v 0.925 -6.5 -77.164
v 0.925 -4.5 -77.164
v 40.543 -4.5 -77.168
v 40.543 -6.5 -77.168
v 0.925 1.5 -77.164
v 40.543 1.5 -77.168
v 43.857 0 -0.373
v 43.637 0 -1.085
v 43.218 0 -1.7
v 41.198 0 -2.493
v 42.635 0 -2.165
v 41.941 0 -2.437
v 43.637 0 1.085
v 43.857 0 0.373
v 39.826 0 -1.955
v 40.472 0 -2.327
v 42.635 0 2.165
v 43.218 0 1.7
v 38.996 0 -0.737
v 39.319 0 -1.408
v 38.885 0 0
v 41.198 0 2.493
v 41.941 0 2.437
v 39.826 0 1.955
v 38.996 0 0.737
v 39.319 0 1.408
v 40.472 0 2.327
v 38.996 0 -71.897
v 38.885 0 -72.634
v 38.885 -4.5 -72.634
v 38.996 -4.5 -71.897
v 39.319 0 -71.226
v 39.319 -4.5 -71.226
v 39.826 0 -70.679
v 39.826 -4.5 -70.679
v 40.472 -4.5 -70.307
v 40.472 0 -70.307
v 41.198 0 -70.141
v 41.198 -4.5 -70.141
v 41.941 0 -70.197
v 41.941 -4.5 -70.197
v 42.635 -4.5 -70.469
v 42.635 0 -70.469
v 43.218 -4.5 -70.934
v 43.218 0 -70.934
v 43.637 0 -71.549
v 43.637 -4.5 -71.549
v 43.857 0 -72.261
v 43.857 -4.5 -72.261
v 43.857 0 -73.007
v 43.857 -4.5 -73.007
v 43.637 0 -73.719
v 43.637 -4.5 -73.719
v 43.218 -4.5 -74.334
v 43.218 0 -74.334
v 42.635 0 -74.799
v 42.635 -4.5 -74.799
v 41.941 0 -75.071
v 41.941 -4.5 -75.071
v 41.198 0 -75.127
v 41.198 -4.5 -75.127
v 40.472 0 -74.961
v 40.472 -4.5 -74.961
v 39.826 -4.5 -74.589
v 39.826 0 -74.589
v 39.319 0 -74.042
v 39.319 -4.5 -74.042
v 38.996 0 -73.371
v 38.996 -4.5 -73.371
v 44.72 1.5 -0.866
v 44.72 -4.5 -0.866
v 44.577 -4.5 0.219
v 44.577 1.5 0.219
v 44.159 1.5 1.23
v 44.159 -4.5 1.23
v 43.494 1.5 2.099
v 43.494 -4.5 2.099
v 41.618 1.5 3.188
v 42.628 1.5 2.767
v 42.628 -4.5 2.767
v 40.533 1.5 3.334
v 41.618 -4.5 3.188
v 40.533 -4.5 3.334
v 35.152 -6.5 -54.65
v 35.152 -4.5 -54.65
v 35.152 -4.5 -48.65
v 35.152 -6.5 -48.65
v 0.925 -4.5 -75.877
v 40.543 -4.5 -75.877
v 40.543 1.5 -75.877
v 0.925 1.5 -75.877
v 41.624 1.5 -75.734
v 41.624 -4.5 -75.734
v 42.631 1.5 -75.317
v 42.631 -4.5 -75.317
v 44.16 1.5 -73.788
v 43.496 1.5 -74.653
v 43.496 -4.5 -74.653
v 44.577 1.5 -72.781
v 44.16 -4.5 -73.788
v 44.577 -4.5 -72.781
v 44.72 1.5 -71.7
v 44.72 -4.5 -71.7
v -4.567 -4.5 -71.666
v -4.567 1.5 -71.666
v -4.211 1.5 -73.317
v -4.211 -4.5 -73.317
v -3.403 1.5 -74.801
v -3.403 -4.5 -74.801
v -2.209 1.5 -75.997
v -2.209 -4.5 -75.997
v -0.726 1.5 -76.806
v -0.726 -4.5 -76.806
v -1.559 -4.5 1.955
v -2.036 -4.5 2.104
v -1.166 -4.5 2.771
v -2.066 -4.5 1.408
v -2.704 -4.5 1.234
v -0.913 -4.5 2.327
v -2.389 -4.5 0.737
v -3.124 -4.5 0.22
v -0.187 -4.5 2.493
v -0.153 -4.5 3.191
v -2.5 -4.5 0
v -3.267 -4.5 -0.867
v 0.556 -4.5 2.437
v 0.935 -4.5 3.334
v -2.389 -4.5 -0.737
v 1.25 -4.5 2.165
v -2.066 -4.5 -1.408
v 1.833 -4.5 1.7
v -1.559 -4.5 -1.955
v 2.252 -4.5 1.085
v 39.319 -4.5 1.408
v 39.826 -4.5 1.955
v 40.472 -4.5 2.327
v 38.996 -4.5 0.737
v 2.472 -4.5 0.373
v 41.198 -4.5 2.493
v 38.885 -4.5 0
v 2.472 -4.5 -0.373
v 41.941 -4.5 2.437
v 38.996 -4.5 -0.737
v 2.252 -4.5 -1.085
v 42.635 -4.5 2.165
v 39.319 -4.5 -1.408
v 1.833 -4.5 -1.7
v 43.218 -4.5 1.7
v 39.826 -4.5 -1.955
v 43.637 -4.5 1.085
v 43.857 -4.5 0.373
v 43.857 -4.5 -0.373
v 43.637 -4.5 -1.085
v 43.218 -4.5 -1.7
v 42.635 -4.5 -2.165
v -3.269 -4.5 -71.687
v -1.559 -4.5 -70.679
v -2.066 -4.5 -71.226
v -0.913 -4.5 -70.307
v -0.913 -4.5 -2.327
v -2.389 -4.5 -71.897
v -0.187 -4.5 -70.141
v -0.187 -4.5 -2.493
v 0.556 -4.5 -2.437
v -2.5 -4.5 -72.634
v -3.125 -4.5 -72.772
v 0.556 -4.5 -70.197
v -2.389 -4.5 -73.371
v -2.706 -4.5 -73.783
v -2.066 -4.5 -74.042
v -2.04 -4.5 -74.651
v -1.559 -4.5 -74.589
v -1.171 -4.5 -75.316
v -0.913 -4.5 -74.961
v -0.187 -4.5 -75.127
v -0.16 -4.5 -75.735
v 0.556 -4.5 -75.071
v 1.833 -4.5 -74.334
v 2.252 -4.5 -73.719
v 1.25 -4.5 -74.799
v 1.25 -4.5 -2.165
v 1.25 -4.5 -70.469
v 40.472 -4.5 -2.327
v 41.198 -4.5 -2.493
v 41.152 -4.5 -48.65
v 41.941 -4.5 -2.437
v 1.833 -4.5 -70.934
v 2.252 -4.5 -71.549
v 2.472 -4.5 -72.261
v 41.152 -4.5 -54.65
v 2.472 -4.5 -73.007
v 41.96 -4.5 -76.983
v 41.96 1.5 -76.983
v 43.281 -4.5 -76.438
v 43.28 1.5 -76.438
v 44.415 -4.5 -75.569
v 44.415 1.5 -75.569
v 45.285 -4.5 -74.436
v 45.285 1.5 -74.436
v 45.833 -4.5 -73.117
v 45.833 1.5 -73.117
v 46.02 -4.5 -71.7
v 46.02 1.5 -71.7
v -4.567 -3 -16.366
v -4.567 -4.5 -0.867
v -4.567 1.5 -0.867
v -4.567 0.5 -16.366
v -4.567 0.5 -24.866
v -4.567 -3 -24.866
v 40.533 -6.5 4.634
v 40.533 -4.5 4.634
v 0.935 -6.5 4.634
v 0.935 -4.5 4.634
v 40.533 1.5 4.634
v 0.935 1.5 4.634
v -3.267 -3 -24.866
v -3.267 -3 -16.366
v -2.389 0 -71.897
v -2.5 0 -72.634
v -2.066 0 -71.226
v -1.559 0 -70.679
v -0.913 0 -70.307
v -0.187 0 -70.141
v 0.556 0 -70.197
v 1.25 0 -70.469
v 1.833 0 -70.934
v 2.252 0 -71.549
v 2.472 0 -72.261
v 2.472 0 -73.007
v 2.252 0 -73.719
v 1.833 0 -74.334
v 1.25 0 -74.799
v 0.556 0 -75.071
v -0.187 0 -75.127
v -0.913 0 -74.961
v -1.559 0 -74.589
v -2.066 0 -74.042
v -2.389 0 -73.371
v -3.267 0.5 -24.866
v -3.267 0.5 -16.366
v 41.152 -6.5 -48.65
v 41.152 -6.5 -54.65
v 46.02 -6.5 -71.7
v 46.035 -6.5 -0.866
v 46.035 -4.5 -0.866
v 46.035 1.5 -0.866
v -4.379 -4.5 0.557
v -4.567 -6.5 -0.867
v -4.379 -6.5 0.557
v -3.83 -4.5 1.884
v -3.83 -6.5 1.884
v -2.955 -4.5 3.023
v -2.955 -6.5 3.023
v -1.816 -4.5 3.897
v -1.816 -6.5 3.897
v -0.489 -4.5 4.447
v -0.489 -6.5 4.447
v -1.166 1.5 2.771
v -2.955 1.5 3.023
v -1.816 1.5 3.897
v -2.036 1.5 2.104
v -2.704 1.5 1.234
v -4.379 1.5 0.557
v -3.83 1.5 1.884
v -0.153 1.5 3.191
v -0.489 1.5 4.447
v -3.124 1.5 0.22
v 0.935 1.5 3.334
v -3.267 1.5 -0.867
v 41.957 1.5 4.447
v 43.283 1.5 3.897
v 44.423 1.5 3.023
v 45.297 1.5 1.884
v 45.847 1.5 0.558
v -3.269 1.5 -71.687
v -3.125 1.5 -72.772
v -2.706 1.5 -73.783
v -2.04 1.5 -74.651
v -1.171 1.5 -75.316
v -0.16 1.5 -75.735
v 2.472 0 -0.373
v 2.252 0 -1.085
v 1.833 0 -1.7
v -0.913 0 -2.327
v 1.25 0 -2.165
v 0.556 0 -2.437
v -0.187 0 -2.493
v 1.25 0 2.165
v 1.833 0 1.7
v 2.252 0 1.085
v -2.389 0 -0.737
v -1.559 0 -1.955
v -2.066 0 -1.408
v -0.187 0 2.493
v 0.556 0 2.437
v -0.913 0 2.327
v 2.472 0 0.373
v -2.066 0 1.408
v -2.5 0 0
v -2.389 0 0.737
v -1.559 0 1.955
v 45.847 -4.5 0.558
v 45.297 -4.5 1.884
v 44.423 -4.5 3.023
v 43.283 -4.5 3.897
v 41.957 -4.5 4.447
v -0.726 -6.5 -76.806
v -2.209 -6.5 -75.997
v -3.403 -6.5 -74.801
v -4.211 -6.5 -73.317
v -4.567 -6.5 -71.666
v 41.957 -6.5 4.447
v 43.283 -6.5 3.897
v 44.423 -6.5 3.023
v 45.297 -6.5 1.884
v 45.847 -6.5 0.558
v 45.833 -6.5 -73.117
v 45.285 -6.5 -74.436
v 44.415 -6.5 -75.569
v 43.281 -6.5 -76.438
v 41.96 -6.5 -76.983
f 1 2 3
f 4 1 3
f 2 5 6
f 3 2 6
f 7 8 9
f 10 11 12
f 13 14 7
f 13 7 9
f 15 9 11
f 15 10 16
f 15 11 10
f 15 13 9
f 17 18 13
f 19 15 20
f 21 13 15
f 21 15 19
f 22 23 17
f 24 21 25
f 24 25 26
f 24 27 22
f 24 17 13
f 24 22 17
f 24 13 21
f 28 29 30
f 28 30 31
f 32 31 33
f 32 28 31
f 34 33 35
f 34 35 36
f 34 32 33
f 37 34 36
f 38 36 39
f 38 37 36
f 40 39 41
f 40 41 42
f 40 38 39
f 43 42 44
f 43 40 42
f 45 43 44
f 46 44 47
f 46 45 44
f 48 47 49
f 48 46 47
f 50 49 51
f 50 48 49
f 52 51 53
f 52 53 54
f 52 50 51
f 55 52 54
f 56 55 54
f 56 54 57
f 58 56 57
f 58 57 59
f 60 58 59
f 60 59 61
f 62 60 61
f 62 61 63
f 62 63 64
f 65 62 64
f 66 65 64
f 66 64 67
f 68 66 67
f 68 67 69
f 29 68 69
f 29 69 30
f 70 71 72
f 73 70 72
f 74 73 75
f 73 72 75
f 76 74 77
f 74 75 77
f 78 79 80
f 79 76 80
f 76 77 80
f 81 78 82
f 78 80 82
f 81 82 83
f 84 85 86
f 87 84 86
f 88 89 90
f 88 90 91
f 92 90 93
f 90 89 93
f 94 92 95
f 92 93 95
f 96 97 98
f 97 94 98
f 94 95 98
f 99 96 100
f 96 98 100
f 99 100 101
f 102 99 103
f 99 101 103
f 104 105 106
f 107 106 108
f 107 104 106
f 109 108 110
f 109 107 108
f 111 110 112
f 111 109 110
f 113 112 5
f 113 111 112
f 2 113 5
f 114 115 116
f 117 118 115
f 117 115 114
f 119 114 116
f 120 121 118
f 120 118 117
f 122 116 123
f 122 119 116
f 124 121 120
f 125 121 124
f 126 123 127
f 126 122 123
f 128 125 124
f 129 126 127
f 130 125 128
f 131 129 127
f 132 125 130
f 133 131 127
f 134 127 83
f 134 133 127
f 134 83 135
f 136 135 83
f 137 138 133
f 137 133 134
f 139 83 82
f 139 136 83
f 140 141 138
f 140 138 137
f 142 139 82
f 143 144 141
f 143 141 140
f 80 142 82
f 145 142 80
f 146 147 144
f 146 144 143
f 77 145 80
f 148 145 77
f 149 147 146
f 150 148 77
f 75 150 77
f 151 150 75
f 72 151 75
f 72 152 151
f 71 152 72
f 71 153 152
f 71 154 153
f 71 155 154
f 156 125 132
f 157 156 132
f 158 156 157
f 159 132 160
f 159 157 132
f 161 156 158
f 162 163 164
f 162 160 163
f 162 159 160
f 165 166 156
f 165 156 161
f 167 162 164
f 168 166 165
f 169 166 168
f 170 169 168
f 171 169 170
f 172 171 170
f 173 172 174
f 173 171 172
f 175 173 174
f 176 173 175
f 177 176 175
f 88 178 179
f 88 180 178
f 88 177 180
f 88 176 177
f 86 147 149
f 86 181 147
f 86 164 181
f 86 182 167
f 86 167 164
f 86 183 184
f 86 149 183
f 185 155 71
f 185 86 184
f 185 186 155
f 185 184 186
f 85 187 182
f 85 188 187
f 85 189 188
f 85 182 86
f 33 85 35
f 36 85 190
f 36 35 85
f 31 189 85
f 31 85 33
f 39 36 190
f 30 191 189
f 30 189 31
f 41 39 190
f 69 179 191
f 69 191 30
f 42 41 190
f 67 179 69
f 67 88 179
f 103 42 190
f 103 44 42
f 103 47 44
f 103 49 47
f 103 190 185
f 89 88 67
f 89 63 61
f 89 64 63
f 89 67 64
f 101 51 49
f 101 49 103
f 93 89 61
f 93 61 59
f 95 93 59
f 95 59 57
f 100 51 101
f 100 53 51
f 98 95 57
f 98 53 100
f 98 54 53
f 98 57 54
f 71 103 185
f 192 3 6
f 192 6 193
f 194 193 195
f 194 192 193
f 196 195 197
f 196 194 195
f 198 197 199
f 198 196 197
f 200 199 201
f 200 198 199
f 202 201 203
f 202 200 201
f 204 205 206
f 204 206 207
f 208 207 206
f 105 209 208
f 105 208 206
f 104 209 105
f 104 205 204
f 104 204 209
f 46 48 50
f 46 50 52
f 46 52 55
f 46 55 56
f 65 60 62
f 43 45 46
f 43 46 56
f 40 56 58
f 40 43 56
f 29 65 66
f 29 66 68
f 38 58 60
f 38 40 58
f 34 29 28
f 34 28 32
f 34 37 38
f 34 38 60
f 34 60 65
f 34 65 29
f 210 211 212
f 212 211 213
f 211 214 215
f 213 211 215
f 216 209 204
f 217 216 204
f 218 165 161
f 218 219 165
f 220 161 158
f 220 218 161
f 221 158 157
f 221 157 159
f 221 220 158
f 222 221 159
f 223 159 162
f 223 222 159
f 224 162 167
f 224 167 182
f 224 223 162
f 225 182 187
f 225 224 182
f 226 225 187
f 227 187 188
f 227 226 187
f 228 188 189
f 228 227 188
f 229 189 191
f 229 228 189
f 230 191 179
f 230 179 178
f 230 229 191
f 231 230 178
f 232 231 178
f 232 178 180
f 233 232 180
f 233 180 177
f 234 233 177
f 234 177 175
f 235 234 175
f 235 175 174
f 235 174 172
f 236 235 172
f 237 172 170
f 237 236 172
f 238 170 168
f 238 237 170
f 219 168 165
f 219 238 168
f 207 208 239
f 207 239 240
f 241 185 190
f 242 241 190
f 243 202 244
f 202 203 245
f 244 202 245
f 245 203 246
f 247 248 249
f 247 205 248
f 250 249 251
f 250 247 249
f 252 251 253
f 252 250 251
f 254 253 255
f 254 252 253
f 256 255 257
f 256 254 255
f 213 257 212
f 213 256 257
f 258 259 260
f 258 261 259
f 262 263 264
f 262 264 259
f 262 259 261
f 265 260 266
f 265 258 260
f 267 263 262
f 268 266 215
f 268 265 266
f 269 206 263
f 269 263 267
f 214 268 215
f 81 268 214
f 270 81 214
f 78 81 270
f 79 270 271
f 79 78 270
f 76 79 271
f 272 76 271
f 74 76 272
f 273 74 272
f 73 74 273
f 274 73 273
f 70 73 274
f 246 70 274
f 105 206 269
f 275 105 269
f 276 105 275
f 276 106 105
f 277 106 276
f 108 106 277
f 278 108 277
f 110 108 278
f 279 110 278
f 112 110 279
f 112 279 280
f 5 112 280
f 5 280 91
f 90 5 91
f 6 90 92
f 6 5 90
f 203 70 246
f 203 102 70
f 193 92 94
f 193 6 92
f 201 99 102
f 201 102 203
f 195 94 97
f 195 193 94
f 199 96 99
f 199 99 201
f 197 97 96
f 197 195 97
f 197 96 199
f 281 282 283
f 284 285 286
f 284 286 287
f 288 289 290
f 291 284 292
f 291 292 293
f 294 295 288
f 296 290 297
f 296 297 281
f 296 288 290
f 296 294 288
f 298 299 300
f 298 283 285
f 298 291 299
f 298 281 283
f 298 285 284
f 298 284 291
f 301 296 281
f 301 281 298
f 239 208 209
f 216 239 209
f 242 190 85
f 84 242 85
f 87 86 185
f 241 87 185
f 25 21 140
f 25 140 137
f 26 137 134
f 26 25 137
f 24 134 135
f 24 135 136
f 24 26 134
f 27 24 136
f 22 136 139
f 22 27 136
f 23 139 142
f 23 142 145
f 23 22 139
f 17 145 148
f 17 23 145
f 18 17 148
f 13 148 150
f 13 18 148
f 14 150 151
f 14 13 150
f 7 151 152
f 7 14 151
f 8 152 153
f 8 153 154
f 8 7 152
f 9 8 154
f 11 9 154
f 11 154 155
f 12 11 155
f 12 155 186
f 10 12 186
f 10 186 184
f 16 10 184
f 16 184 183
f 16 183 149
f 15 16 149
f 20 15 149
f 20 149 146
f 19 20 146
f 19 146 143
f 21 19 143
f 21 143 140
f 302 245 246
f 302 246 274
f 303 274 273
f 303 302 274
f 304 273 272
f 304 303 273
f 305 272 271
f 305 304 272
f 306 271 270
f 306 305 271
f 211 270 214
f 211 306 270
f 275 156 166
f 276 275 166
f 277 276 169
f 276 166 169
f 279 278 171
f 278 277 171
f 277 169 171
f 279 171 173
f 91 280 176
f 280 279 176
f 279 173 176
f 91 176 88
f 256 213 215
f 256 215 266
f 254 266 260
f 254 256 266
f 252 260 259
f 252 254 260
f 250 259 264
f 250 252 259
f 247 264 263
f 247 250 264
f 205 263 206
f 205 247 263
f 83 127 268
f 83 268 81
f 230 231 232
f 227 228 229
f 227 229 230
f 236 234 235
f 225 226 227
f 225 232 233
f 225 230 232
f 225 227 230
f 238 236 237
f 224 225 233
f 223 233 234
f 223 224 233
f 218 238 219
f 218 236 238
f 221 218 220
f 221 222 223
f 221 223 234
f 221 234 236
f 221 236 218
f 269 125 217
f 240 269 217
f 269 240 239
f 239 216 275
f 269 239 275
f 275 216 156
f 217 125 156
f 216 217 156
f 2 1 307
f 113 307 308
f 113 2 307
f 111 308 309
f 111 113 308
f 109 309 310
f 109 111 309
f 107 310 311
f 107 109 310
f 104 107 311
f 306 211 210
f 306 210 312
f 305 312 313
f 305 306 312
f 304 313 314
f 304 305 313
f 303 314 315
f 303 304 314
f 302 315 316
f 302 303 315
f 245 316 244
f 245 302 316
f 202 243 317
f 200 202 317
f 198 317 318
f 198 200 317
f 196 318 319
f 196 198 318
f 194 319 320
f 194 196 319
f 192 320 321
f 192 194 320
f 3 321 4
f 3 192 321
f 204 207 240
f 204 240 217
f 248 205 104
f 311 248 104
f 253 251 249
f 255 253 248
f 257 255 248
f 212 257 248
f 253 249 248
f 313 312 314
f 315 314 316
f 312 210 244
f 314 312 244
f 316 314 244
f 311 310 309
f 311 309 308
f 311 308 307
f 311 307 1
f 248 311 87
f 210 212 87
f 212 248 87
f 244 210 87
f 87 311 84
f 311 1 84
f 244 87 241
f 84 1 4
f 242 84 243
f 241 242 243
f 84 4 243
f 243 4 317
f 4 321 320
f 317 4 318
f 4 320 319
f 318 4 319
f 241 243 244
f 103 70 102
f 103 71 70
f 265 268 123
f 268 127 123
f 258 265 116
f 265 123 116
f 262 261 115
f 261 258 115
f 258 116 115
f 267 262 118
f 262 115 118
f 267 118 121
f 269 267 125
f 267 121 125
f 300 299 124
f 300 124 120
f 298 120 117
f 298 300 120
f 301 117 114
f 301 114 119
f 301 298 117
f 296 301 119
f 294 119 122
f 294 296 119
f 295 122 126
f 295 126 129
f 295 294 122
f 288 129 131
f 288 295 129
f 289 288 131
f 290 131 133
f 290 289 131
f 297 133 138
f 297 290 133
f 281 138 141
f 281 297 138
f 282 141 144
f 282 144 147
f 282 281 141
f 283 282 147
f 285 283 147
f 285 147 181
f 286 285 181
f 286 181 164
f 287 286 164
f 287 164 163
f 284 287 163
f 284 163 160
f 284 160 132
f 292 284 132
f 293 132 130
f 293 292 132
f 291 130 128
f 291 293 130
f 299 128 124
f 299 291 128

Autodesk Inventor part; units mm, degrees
ref_plane "YZ Plane" through (0, 0, 0) normal (1, 0, 0) x (0, 1, 0)
ref_plane "XZ Plane" through (0, 0, 0) normal (0, 1, 0) x (-1, 0, 0)
ref_plane "XY Plane" through (0, 0, 0) normal (0, 0, 1) x (1, 0, 0)
sketch "Эскиз1" plane through (0, 0, 0) normal (0, 1, 0) x (-1, 0, 0)
  circle A0 centre (0, 0) radius 2.5
  circle A1 centre (0, -72.634) radius 2.5
  circle A2 centre (-41.385, -72.634) radius 2.5
  circle A3 centre (-41.385, 0) radius 2.5
  dimension "d1" = 5
  dimension "d3" = 5
  dimension "d5" = 5
  dimension "d7" = 5
extrude "Выдавливание1" add sketch "Эскиз1" against normal blind 4.5
sketch "Эскиз3" plane through (0, 0, 0) normal (0, 1, 0) x (1, 0, 0)
  line L0 (-4.5666, 0.8672) -> (-4.5666, 71.6657)
  line L1 (0.9251, 77.1637) -> (40.5431, 77.1677)
  line L2 (46.0198, 71.7001) -> (46.0348, 0.8657)
  line L3 (40.5334, -4.6343) -> (0.9348, -4.6343)
  arc A0 (-4.5666, 0.8672) -> (0.9348, -4.6343) centre (0.9348, 0.8672) ccw
  arc A1 (46.0198, 71.7001) -> (40.5431, 77.1677) centre (40.551, 71.699) ccw
  arc A2 (40.5334, -4.6343) -> (46.0348, 0.8657) centre (40.5319, 0.8687) ccw
  line L4 (35.1515, 48.9499) -> (35.1515, 54.3499)
  line L5 (35.1515, 54.6499) -> (35.1515, 48.6499)
  line L6 (35.4515, 54.6499) -> (40.8515, 54.6499)
  line L7 (41.1515, 54.6499) -> (35.1515, 54.6499)
  line L8 (40.8515, 48.6499) -> (35.4515, 48.6499)
  line L9 (41.1515, 54.3499) -> (41.1515, 48.9499)
  line L10 (41.1515, 48.6499) -> (41.1515, 54.6499)
  line L11 (35.1515, 48.6499) -> (41.1515, 48.6499)
  arc A3 (0.9251, 77.1637) -> (-4.5666, 71.6657) centre (1.3393, 71.2583) ccw
extrude "Выдавливание2" add sketch "Эскиз3" against normal blind 2 from surface at -4.5
sketch "Эскиз4" plane through (0.9348, -4.5, 4.6343) normal (0, 1, 0) x (1, 0, 0)
  line L0 (-5.5015, 5.5015) -> (-5.5015, 76.3) projected
  arc A0 (-4.2015, 5.5015) -> (0, 1.3) centre (0, 5.5015) ccw
  line L1 (45.085, 76.3344) -> (45.1, 5.5) projected
  line L2 (-0.0097, 81.798) -> (39.6083, 81.802) projected
  arc A1 (-0.0097, 80.5111) -> (-4.2035, 76.3214) centre (-0.0118, 76.3194) ccw
  arc A2 (43.785, 76.3344) -> (39.6083, 80.5111) centre (39.6083, 76.3344) ccw
  arc A3 (39.5985, 1.3) -> (43.785, 5.5) centre (39.585, 5.5) ccw
  line L3 (0, 1.3) -> (39.5985, 1.3)
  line L4 (43.785, 5.5) -> (43.785, 76.3344)
  line L5 (39.6083, 80.5111) -> (-0.0097, 80.5111)
  arc A4 (-5.5015, 5.5015) -> (0, 0) centre (0, 5.5015) ccw projected
  arc A5 (-0.0097, 81.798) -> (-5.5015, 76.3) centre (0.4044, 75.8926) ccw projected
  line L6 (-0.0097, 81.798) -> (39.6083, 81.802) projected
  arc A6 (45.085, 76.3344) -> (39.6083, 81.802) centre (39.6162, 76.3332) ccw projected
  arc A7 (39.5985, 0) -> (45.1, 5.5) centre (39.5971, 5.5029) ccw projected
  line L7 (39.5985, 0) -> (0, 0) projected
  arc A8 (-5.5015, 5.5015) -> (0, 0) centre (0, 5.5015) ccw
  arc A9 (-0.0097, 81.798) -> (-5.5015, 76.3) centre (0.4044, 75.8926) ccw
  arc A10 (45.085, 76.3344) -> (39.6083, 81.802) centre (39.6162, 76.3332) ccw projected
  arc A11 (45.085, 76.3344) -> (39.6083, 81.802) centre (39.6088, 76.3258) ccw
  arc A12 (39.5985, 0) -> (45.1, 5.5) centre (39.5971, 5.5029) ccw
  line L8 (-5.5015, 5.5015) -> (-5.5015, 76.3)
  line L9 (-0.0097, 81.798) -> (39.6083, 81.802)
  line L10 (45.085, 76.3344) -> (45.1, 5.5082)
  line L11 (39.5985, 0) -> (0, 0)
  line L12 (-4.2015, 5.5015) -> (-4.2035, 76.3214)
  circle A13 centre (40.4502, 77.2683) radius 1.5 projected
  point P0 (-0.9348, 4.6343)
extrude "Выдавливание3" add sketch "Эскиз4" along normal blind 6 contours L0 A5 L2 A11 L1 A7 L7 A4 | A6 A11
sketch "Эскиз5" plane through (-4.5666, -6.5, -71.6657) normal (-1, 0, 0) x (0, 0, 1)
  line L0 (-5.498, 0) -> (0, 0) projected
  line L1 (55.3, 7) -> (55.3, 3.5)
  line L2 (-0.0344, 8) -> (70.8, 8) projected
  line L3 (76.3, 0) -> (76.3, 8) projected
  line L4 (46.8, 7) -> (46.8, 3.5)
  line L5 (46.8, 3.5) -> (55.3, 3.5)
  line L6 (-0.0344, 0) -> (70.8, 0) projected
  line L7 (46.8, 7) -> (55.3, 7)
  line L8 (74.1657, 6.5) -> (69.1657, 6.5) projected
  point P0 (71.6657, 6.5)
  point P1 (57.3, 6.5)
  dimension "d24" = 21
  dimension "d25" = 8.5
  dimension "d26" = 3.5
extrude "Выдавливание4" cut sketch "Эскиз5" against normal blind 6
properties part number "Основание" material "Каучук, силиконовый"
